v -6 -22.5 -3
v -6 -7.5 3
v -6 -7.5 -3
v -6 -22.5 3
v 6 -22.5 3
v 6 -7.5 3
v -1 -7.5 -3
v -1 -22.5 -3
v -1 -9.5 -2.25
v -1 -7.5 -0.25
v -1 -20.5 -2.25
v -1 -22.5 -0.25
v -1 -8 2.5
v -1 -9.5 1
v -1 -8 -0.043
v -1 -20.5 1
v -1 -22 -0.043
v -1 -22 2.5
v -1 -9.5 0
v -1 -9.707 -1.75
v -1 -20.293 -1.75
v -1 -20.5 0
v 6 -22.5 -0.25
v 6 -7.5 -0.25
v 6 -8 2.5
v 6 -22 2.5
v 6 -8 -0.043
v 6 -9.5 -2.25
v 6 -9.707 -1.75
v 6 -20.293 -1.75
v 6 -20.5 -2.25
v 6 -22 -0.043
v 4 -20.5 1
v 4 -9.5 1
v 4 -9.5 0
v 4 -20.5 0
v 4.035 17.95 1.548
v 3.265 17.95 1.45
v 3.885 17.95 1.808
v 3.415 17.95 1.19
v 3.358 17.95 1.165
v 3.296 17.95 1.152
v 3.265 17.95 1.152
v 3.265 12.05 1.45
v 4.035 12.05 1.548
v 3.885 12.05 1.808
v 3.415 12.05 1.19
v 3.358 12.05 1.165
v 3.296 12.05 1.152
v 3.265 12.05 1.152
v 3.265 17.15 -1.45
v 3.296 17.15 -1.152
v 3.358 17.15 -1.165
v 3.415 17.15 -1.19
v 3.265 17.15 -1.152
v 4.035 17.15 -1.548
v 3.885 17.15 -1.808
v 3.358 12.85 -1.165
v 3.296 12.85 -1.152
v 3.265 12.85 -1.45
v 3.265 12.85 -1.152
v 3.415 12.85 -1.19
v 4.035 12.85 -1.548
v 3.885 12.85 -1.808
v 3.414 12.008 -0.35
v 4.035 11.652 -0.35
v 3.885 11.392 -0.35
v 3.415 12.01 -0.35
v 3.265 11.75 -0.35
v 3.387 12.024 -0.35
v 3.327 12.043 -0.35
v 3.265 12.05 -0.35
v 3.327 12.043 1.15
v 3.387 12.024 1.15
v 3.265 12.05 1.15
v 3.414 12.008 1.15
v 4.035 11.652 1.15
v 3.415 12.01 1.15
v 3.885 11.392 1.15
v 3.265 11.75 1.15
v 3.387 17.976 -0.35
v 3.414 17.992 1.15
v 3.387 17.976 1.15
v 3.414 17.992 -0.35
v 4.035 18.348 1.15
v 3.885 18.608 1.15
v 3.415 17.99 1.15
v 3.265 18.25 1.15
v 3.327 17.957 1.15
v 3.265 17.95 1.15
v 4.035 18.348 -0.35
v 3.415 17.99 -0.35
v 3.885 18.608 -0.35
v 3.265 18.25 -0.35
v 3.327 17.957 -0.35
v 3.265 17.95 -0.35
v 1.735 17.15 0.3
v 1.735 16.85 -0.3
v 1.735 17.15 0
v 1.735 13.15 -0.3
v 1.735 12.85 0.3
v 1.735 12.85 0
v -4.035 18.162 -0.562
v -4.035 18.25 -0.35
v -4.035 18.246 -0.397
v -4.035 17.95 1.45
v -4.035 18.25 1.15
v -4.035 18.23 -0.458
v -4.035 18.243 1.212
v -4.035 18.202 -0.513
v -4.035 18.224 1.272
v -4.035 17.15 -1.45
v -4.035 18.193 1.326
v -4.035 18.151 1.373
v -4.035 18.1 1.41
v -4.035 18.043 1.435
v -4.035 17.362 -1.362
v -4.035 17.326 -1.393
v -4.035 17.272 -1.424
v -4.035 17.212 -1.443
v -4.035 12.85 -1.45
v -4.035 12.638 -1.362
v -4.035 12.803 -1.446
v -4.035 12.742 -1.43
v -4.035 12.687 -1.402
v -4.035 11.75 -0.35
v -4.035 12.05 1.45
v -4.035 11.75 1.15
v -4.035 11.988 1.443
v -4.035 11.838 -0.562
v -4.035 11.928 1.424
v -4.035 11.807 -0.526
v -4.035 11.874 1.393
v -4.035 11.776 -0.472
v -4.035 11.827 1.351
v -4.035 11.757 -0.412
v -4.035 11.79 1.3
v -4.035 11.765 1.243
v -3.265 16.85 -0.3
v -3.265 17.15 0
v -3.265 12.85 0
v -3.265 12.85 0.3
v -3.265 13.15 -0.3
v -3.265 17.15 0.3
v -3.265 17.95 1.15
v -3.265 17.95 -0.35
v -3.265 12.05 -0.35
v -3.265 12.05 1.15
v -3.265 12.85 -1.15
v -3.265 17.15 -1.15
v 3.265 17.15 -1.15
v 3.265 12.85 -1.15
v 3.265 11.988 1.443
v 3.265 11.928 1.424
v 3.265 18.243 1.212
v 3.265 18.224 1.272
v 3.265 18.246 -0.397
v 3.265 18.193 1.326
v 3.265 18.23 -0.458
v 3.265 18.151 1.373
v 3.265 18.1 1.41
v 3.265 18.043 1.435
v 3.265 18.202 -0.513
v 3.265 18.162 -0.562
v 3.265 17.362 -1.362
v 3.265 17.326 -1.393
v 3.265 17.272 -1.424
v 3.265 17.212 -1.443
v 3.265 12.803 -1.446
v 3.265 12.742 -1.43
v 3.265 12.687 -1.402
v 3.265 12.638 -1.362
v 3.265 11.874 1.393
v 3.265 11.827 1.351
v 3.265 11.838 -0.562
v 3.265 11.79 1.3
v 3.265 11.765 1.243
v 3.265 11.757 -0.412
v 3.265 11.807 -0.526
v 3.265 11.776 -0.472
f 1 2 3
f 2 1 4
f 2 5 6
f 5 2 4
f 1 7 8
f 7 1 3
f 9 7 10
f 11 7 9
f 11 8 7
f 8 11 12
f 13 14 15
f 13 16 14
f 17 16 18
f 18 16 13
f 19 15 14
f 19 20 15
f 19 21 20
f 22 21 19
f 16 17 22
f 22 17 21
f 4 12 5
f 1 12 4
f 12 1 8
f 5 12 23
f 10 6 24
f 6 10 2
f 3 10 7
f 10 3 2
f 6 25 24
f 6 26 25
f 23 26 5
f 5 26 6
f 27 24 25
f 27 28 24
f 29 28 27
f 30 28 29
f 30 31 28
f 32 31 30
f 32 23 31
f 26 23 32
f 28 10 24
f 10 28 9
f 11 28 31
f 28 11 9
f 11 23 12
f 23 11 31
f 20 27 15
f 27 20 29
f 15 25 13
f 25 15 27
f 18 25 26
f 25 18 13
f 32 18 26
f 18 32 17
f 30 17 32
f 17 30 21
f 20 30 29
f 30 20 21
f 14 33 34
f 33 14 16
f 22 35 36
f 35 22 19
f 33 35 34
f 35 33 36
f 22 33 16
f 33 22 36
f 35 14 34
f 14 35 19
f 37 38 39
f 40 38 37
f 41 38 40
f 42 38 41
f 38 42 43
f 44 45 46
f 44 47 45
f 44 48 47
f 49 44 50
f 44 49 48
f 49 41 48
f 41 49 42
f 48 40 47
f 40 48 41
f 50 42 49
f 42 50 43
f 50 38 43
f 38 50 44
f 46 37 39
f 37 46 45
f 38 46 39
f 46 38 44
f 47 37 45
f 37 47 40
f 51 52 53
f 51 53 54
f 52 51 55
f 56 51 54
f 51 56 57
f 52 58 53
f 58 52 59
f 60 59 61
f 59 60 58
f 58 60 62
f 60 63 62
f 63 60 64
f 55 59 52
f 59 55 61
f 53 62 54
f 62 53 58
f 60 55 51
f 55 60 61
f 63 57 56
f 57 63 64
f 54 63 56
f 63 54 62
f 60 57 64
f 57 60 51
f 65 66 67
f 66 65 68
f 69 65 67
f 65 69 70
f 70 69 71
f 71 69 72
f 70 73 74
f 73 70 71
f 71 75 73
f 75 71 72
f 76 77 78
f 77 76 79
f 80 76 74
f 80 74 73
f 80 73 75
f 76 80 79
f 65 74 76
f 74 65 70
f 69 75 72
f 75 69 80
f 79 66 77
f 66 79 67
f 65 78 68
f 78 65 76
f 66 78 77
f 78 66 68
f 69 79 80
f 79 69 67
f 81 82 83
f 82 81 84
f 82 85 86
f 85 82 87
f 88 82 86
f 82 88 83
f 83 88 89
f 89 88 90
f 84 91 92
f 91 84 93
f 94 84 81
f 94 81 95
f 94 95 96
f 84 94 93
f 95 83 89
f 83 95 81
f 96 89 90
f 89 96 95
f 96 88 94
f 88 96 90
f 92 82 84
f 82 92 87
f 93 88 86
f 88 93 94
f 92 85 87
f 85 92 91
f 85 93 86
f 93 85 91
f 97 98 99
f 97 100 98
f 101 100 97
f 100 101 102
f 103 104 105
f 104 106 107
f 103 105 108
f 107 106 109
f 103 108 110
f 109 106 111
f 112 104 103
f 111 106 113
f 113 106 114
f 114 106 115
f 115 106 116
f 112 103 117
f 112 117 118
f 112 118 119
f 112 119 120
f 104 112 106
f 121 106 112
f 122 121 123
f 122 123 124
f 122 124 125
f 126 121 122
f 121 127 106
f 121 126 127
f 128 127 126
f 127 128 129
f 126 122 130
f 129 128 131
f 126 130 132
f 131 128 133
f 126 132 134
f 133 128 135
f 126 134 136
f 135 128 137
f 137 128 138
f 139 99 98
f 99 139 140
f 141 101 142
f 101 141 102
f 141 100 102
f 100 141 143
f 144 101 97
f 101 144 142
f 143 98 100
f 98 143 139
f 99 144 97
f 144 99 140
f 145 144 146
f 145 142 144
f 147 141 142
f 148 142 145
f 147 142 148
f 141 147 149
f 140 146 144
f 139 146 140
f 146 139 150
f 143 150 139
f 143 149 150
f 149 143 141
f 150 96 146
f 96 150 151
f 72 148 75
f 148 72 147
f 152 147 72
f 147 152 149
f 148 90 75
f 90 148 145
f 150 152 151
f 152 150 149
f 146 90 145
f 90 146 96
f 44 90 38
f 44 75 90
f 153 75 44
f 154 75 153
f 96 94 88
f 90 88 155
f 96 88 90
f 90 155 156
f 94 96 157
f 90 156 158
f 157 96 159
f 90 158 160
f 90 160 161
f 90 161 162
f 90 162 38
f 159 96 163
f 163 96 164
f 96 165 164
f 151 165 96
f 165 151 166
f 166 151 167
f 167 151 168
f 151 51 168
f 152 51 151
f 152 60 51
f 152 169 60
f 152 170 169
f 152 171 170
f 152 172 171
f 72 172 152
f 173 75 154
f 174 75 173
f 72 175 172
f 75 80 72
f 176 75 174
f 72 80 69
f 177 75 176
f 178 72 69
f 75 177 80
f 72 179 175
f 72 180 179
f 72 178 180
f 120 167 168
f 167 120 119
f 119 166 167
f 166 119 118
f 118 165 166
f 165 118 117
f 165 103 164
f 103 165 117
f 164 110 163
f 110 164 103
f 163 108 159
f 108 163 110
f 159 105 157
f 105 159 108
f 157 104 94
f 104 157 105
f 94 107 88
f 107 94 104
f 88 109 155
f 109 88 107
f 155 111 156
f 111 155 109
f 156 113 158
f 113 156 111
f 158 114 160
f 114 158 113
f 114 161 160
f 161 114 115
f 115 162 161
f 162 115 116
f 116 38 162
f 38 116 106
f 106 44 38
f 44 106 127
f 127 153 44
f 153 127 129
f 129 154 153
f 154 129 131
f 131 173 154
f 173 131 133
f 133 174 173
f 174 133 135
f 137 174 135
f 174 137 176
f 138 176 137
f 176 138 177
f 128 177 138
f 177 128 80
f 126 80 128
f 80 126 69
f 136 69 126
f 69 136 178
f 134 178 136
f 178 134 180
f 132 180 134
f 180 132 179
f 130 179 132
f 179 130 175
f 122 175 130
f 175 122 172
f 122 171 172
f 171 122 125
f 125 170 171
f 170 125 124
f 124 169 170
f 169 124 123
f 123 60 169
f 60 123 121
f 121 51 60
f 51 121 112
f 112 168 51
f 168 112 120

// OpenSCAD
// file: ../globals.scad
// Copyright (c) 2017 Clément Bœsch <u pkh.me>
//
// Permission to use, copy, modify, and distribute this software for any
// purpose with or without fee is hereby granted, provided that the above
// copyright notice and this permission notice appear in all copies.
//
// THE SOFTWARE IS PROVIDED "AS IS" AND THE AUTHOR DISCLAIMS ALL WARRANTIES
// WITH REGARD TO THIS SOFTWARE INCLUDING ALL IMPLIED WARRANTIES OF
// MERCHANTABILITY AND FITNESS. IN NO EVENT SHALL THE AUTHOR BE LIABLE FOR
// ANY SPECIAL, DIRECT, INDIRECT, OR CONSEQUENTIAL DAMAGES OR ANY DAMAGES
// WHATSOEVER RESULTING FROM LOSS OF USE, DATA OR PROFITS, WHETHER IN AN
// ACTION OF CONTRACT, NEGLIGENCE OR OTHER TORTIOUS ACTION, ARISING OUT OF
// OR IN CONNECTION WITH THE USE OR PERFORMANCE OF THIS SOFTWARE.

$fn = 30;

_delta = 0.005;

c_black        = [.17,.17,.17];
c_black_redish = [.35,.30,.30];
c_gold         = [.75,.55,.00];
c_gray         = [.40,.40,.40];
c_darkgray     = [.25,.25,.25];
c_green_pcb    = [.00,.50,.25];
c_metal        = [.70,.70,.70];
c_yellow       = [.70,.70,.30];
c_darkblue     = [.20,.30,.40];
c_usb_blue     = [.20,.60,  1];
// file: _internal.scad
// Copyright (c) 2017 Clément Bœsch <u pkh.me>
//
// Permission to use, copy, modify, and distribute this software for any
// purpose with or without fee is hereby granted, provided that the above
// copyright notice and this permission notice appear in all copies.
//
// THE SOFTWARE IS PROVIDED "AS IS" AND THE AUTHOR DISCLAIMS ALL WARRANTIES
// WITH REGARD TO THIS SOFTWARE INCLUDING ALL IMPLIED WARRANTIES OF
// MERCHANTABILITY AND FITNESS. IN NO EVENT SHALL THE AUTHOR BE LIABLE FOR
// ANY SPECIAL, DIRECT, INDIRECT, OR CONSEQUENTIAL DAMAGES OR ANY DAMAGES
// WHATSOEVER RESULTING FROM LOSS OF USE, DATA OR PROFITS, WHETHER IN AN
// ACTION OF CONTRACT, NEGLIGENCE OR OTHER TORTIOUS ACTION, ARISING OUT OF
// OR IN CONNECTION WITH THE USE OR PERFORMANCE OF THIS SOFTWARE.

include <../globals.scad>

$vpr = [50, 0, 90];

module components_demo(pad=30) {
    n = $children;
    cols = ceil(sqrt(n));
    rows = ceil(n / cols);
    offx = pad * (rows - 1) / 2;
    offy = pad * (cols - 1) / 2;
    for (i = [0:n-1]) {
        x = floor(i / cols);
        y = i % cols;
        translate([x*pad - offx, y*pad - offy])
            rotate(360 * $t)
                children(i);
    }
}
// main file
// Copyright (c) 2017 Clément Bœsch <u pkh.me>
//
// Permission to use, copy, modify, and distribute this software for any
// purpose with or without fee is hereby granted, provided that the above
// copyright notice and this permission notice appear in all copies.
//
// THE SOFTWARE IS PROVIDED "AS IS" AND THE AUTHOR DISCLAIMS ALL WARRANTIES
// WITH REGARD TO THIS SOFTWARE INCLUDING ALL IMPLIED WARRANTIES OF
// MERCHANTABILITY AND FITNESS. IN NO EVENT SHALL THE AUTHOR BE LIABLE FOR
// ANY SPECIAL, DIRECT, INDIRECT, OR CONSEQUENTIAL DAMAGES OR ANY DAMAGES
// WHATSOEVER RESULTING FROM LOSS OF USE, DATA OR PROFITS, WHETHER IN AN
// ACTION OF CONTRACT, NEGLIGENCE OR OTHER TORTIOUS ACTION, ARISING OUT OF
// OR IN CONNECTION WITH THE USE OR PERFORMANCE OF THIS SOFTWARE.

include <_internal.scad>

$vpd = 150;

module hdmi(dim=[12, 15, 6]) {
    l = dim[0];
    w = dim[1];
    h = dim[2];
    lowest = h - 5.25;
    hdmi_polygon_pos = [[0, h], [w, h], [w, h-3.25],
                        [w-2, lowest], [2, lowest], [0, h-3.25]];

    rotate([0, 0, 180]) // XXX
    translate(dim * -.5) { // XXX
        color(c_metal) {
            translate([7, 0, 0])
                cube([l-7, w, h]);
            rotate([90, 0, 90]) {
                linear_extrude(height=7) {
                    difference() {
                        polygon(hdmi_polygon_pos);
                        offset(r=-.5)
                            polygon(hdmi_polygon_pos);
                    }
                }
            }
        }
        color(c_black)
            translate([2, 2, 3])
                cube([7, w-2*2, 1]);
    }
}


module horz_fold(a,l,w,t) {
    rotate(a=a, v=[0,1,0]) translate([l/2,0,sign(a)*t/2]) cube([l, w, t], center=true);
    intersection() { // fold radius
        translate([0,0,0]) rotate([90,0,0]) cylinder(r=t, h=w,center=true);
        translate([t/2,0,sign(a)*t/2]) cube([t,w,t], center=true);
    }
}

module vert_fold(a,l,w,t) {
    rotate(a=a, v=[0,0,1]) translate([l/2,-sign(a)*t/2,0]) cube([l, t, w], center=true);
    intersection() { // fold radius
        translate([0,0,0]) rotate([0,0,90]) cylinder(r=t, h=w,center=true);
        translate([t/2,-sign(a)*t/2,0]) cube([t,t,w], center=true);
    }
}

// VALCON HD-RA-DSF12-TR from RPi4
// dim is dimensions of connector before folds
module microhdmi(dim=[7.3, 6.5, 3.25], l_fold=0.77, t=0.3) {
    tab_h = 0.6;
    tab_w1 = 4.3;
    tab_w2 = 3.7;
    inner_w1 = 5.9;
    inner_w2 = tab_w1;
    inner_h = 2.3;

    l = dim[0];
    w = dim[1];
    h = dim[2];
    l2 = l + l_fold;

    recess_tab = 1.53;
    l_tab = l-recess_tab;
    l_plug = 0.77;

    p = 0.55;
    a_fold = 30;
    z = (l_fold-t*sin(a_fold)) / cos(a_fold);

    translate([l2/2,0,0]) {
        tab_chamfer = (tab_w1-tab_w2)/2;
        tabPoints = [
            [-tab_w1/2,tab_h/2], [tab_w1/2,tab_h/2], 
            [tab_w1/2,tab_chamfer-tab_h/2], [tab_w2/2,-tab_h/2],
            [-tab_w2/2,-tab_h/2], [-tab_w1/2,tab_chamfer-tab_h/2]
        ];
        inner_chamfer = (inner_w1-inner_w2)/2;
        innerPoints = [
            [-inner_w1/2,inner_h/2], [inner_w1/2,inner_h/2], 
            [inner_w1/2,inner_chamfer-inner_h/2], [inner_w2/2,-inner_h/2],
            [-inner_w2/2,-inner_h/2], [-inner_w1/2,inner_chamfer-inner_h/2]
        ];
        if (l_fold > 0) color(c_metal) {
            translate([-l_fold,0, inner_h/2+t]) horz_fold(-a_fold, z, inner_w1, t);
            translate([-l_fold,0,-inner_h/2-t]) horz_fold( a_fold, z, inner_w2, t);
            translate([-l_fold,-w/2,inner_chamfer/2]) vert_fold(-a_fold, z, inner_h-inner_chamfer, t);
            translate([-l_fold, w/2,inner_chamfer/2]) vert_fold( a_fold, z, inner_h-inner_chamfer, t);
        }
        translate([-l2,0,0]) {
            color(c_black) rotate([90,0,90]) {
                linear_extrude(height=l_tab) polygon(tabPoints);
                linear_extrude(height=l_plug) polygon(innerPoints);
            }
            color(c_metal) rotate([90,0,90])
                linear_extrude(height=l) difference() {
                    offset(t) polygon(innerPoints);
                    polygon(innerPoints);
                }
        }
    }
}

function hdmi_info() = [
    ["category", "hdmi"],
    ["watch", "horizon"],
];

function microhdmi_info() = hdmi_info();


components_demo() {
    hdmi();
    microhdmi();
}
